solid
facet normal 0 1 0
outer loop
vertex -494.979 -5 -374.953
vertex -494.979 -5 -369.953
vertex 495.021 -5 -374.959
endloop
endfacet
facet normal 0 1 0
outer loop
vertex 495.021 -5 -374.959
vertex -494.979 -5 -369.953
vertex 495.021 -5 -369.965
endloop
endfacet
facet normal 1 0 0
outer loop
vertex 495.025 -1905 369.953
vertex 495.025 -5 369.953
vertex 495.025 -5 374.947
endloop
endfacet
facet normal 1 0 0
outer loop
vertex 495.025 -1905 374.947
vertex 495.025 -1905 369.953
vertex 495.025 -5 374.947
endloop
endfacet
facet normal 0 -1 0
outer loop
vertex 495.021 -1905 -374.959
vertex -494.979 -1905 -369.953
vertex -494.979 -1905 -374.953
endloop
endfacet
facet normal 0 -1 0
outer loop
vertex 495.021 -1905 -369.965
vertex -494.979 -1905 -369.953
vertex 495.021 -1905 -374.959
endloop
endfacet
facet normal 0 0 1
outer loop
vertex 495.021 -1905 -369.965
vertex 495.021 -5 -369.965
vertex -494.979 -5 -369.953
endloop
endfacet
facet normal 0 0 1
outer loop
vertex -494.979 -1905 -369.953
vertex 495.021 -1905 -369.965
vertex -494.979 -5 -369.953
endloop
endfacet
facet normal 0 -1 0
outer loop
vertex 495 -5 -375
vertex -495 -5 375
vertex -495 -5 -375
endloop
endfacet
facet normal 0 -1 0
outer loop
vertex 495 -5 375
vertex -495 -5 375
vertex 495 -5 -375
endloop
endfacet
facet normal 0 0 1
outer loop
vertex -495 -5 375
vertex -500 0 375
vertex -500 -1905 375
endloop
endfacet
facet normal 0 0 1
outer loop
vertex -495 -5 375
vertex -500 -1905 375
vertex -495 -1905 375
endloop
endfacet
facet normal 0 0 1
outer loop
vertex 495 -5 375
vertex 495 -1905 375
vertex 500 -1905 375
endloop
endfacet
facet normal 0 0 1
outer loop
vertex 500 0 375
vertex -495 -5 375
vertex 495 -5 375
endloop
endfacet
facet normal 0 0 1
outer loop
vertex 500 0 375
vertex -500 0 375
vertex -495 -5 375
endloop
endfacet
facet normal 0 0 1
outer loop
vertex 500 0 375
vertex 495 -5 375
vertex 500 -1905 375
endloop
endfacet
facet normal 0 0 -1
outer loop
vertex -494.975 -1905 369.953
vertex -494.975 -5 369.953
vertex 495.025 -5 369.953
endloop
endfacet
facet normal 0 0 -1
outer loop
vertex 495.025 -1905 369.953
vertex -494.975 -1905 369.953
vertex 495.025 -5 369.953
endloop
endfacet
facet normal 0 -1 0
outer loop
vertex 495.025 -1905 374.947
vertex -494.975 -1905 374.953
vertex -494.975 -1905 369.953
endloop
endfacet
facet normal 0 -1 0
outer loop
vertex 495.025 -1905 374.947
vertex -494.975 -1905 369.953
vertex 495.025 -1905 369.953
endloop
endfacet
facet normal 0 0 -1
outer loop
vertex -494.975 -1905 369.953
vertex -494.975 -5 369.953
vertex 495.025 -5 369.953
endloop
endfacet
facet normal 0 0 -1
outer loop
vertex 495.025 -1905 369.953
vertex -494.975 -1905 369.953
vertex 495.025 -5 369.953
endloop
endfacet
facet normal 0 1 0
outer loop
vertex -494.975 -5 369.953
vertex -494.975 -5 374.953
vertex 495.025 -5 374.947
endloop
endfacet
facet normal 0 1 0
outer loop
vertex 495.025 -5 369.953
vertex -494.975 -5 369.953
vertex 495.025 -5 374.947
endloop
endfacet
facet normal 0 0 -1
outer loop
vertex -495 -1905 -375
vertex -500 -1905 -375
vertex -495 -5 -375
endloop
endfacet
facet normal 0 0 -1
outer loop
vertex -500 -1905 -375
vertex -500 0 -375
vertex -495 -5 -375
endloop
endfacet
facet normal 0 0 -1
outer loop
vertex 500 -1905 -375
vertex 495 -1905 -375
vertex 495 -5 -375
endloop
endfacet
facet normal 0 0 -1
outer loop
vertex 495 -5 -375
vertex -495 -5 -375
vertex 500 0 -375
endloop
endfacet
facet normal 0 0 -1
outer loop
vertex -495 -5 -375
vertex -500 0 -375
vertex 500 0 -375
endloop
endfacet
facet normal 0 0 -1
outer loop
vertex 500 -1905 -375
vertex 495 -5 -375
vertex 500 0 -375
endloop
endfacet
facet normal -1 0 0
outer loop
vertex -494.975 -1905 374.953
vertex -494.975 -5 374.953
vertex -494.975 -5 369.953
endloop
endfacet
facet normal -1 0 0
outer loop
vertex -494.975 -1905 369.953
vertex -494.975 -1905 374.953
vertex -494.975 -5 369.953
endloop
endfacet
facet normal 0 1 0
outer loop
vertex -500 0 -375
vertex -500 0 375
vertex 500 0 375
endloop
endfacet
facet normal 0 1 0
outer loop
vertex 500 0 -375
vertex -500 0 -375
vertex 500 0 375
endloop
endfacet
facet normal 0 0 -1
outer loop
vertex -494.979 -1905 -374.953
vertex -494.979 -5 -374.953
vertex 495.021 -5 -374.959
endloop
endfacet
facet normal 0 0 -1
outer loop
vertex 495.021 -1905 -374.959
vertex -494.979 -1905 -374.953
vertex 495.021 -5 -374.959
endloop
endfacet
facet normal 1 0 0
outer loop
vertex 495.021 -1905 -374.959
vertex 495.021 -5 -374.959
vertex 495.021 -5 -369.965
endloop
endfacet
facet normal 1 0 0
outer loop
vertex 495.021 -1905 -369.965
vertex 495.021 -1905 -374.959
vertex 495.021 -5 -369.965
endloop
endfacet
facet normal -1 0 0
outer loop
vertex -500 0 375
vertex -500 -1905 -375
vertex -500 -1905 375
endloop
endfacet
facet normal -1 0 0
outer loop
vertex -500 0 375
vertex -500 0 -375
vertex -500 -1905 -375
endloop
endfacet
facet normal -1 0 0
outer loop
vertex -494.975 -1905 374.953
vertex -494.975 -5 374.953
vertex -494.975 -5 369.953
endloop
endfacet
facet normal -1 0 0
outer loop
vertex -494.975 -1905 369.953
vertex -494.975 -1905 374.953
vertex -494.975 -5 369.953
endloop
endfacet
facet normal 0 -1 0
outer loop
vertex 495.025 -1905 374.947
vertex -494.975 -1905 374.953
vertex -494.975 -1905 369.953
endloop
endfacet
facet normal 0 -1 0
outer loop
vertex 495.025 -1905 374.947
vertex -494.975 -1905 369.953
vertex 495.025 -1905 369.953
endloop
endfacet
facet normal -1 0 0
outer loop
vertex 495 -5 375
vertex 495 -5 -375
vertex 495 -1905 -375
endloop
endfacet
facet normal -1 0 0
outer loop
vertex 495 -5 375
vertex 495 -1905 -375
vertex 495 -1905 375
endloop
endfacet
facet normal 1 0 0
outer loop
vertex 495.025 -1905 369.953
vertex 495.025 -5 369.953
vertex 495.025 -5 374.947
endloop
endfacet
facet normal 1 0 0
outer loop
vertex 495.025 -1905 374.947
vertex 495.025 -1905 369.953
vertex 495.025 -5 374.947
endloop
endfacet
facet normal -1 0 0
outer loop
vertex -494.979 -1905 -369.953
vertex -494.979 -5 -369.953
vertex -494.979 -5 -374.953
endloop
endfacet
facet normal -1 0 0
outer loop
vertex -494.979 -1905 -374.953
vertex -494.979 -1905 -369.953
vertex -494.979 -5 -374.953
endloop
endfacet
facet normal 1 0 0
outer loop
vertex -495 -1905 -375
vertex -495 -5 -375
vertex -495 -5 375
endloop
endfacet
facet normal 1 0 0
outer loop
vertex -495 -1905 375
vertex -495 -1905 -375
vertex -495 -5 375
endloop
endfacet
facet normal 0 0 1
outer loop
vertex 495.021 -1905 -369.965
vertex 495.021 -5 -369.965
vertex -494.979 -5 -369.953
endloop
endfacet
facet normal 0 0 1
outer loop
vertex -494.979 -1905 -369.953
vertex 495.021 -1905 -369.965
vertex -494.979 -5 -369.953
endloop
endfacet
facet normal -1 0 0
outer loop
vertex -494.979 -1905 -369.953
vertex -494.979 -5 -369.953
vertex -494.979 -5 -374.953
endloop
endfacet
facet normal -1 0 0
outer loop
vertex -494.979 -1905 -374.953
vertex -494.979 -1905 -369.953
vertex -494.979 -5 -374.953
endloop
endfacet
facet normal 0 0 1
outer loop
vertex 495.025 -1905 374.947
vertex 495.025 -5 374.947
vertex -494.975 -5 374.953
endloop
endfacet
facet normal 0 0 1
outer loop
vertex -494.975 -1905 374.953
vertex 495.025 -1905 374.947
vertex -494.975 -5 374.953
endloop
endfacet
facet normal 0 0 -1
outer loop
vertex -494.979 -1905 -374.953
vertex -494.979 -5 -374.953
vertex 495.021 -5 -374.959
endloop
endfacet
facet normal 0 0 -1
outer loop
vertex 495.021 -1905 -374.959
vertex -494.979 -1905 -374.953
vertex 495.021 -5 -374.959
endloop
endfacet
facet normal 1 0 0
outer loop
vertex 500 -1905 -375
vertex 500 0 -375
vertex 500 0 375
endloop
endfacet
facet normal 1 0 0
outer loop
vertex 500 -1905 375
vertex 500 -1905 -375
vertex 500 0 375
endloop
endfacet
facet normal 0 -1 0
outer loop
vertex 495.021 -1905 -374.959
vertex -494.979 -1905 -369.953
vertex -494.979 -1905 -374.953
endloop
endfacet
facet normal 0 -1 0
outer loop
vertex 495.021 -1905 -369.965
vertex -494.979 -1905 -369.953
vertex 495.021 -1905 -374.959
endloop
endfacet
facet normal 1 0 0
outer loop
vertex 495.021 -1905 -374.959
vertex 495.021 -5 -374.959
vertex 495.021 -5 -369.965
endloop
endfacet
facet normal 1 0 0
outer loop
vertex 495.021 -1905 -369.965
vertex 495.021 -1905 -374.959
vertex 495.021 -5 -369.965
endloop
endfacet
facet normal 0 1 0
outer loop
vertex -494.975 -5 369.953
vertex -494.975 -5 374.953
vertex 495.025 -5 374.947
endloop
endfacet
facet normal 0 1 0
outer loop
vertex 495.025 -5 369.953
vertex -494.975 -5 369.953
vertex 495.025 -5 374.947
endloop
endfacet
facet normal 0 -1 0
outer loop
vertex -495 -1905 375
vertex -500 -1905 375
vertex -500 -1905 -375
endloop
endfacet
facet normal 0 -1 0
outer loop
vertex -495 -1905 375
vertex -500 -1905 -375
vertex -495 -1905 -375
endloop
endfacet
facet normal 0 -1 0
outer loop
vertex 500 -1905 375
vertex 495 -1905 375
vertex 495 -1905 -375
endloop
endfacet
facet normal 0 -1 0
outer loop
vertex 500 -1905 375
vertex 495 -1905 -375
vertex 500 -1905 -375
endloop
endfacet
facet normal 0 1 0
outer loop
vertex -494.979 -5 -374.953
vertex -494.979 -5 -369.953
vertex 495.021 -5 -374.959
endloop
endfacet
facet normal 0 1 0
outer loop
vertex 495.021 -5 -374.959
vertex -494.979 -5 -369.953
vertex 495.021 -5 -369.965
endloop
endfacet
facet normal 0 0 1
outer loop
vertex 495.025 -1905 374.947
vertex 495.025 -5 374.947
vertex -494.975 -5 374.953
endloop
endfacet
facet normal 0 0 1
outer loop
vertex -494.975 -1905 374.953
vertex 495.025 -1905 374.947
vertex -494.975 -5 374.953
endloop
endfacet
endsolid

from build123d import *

# Parameters (mm, degrees)
F0_W     = 1000
F0_H     = 750
F1_DEPTH = 5
F2_W     = 5
F2_H     = 750
F3_DEPTH = 1900
F5_DEPTH = 1900
F7_DEPTH = 1900
F8_DEPTH = 1900


with BuildPart() as f1:
    # F0 (on Front) → F1 (new body)
    with BuildSketch(Plane.XZ):
        Rectangle(F0_W, F0_H)
    extrude(amount=F1_DEPTH)

    # F2 (on face) → F3 (join)
    with BuildSketch(Plane.XZ.offset(5)):
        with Locations((-497.5, 0)):
            Rectangle(F2_W, F2_H)
        with Locations((497.5, 0)):
            Rectangle(F2_W, F2_H)
    extrude(amount=F3_DEPTH)

    # F2 (on face) → F5 (join)
    with BuildSketch(Plane.XZ.offset(5)):
        with Locations((-497.5, 0)):
            Rectangle(F2_W, F2_H)
        with Locations((497.5, 0)):
            Rectangle(F2_W, F2_H)
    extrude(amount=F5_DEPTH)


with BuildPart() as f7:
    # F6 (on face) → F7 (new body)
    with BuildSketch(Plane.XZ.offset(5)):
        Polygon((495.025089, 374.946773), (-494.974911, 374.952798), (-494.974911, 369.952798), (495.025089, 369.952798), align=None)
        Polygon((-494.979475, -374.952817), (495.020525, -374.958842), (495.020586, -369.964866), (-494.979414, -369.952817), align=None)
    extrude(amount=F7_DEPTH)


with BuildPart() as f8:
    # F6 (on face) → F8 (new body)
    with BuildSketch(Plane.XZ.offset(5)):
        Polygon((495.025089, 374.946773), (-494.974911, 374.952798), (-494.974911, 369.952798), (495.025089, 369.952798), align=None)
        Polygon((-494.979475, -374.952817), (495.020525, -374.958842), (495.020586, -369.964866), (-494.979414, -369.952817), align=None)
    extrude(amount=F8_DEPTH)


solid = Compound([f1.part, f7.part, f8.part])
